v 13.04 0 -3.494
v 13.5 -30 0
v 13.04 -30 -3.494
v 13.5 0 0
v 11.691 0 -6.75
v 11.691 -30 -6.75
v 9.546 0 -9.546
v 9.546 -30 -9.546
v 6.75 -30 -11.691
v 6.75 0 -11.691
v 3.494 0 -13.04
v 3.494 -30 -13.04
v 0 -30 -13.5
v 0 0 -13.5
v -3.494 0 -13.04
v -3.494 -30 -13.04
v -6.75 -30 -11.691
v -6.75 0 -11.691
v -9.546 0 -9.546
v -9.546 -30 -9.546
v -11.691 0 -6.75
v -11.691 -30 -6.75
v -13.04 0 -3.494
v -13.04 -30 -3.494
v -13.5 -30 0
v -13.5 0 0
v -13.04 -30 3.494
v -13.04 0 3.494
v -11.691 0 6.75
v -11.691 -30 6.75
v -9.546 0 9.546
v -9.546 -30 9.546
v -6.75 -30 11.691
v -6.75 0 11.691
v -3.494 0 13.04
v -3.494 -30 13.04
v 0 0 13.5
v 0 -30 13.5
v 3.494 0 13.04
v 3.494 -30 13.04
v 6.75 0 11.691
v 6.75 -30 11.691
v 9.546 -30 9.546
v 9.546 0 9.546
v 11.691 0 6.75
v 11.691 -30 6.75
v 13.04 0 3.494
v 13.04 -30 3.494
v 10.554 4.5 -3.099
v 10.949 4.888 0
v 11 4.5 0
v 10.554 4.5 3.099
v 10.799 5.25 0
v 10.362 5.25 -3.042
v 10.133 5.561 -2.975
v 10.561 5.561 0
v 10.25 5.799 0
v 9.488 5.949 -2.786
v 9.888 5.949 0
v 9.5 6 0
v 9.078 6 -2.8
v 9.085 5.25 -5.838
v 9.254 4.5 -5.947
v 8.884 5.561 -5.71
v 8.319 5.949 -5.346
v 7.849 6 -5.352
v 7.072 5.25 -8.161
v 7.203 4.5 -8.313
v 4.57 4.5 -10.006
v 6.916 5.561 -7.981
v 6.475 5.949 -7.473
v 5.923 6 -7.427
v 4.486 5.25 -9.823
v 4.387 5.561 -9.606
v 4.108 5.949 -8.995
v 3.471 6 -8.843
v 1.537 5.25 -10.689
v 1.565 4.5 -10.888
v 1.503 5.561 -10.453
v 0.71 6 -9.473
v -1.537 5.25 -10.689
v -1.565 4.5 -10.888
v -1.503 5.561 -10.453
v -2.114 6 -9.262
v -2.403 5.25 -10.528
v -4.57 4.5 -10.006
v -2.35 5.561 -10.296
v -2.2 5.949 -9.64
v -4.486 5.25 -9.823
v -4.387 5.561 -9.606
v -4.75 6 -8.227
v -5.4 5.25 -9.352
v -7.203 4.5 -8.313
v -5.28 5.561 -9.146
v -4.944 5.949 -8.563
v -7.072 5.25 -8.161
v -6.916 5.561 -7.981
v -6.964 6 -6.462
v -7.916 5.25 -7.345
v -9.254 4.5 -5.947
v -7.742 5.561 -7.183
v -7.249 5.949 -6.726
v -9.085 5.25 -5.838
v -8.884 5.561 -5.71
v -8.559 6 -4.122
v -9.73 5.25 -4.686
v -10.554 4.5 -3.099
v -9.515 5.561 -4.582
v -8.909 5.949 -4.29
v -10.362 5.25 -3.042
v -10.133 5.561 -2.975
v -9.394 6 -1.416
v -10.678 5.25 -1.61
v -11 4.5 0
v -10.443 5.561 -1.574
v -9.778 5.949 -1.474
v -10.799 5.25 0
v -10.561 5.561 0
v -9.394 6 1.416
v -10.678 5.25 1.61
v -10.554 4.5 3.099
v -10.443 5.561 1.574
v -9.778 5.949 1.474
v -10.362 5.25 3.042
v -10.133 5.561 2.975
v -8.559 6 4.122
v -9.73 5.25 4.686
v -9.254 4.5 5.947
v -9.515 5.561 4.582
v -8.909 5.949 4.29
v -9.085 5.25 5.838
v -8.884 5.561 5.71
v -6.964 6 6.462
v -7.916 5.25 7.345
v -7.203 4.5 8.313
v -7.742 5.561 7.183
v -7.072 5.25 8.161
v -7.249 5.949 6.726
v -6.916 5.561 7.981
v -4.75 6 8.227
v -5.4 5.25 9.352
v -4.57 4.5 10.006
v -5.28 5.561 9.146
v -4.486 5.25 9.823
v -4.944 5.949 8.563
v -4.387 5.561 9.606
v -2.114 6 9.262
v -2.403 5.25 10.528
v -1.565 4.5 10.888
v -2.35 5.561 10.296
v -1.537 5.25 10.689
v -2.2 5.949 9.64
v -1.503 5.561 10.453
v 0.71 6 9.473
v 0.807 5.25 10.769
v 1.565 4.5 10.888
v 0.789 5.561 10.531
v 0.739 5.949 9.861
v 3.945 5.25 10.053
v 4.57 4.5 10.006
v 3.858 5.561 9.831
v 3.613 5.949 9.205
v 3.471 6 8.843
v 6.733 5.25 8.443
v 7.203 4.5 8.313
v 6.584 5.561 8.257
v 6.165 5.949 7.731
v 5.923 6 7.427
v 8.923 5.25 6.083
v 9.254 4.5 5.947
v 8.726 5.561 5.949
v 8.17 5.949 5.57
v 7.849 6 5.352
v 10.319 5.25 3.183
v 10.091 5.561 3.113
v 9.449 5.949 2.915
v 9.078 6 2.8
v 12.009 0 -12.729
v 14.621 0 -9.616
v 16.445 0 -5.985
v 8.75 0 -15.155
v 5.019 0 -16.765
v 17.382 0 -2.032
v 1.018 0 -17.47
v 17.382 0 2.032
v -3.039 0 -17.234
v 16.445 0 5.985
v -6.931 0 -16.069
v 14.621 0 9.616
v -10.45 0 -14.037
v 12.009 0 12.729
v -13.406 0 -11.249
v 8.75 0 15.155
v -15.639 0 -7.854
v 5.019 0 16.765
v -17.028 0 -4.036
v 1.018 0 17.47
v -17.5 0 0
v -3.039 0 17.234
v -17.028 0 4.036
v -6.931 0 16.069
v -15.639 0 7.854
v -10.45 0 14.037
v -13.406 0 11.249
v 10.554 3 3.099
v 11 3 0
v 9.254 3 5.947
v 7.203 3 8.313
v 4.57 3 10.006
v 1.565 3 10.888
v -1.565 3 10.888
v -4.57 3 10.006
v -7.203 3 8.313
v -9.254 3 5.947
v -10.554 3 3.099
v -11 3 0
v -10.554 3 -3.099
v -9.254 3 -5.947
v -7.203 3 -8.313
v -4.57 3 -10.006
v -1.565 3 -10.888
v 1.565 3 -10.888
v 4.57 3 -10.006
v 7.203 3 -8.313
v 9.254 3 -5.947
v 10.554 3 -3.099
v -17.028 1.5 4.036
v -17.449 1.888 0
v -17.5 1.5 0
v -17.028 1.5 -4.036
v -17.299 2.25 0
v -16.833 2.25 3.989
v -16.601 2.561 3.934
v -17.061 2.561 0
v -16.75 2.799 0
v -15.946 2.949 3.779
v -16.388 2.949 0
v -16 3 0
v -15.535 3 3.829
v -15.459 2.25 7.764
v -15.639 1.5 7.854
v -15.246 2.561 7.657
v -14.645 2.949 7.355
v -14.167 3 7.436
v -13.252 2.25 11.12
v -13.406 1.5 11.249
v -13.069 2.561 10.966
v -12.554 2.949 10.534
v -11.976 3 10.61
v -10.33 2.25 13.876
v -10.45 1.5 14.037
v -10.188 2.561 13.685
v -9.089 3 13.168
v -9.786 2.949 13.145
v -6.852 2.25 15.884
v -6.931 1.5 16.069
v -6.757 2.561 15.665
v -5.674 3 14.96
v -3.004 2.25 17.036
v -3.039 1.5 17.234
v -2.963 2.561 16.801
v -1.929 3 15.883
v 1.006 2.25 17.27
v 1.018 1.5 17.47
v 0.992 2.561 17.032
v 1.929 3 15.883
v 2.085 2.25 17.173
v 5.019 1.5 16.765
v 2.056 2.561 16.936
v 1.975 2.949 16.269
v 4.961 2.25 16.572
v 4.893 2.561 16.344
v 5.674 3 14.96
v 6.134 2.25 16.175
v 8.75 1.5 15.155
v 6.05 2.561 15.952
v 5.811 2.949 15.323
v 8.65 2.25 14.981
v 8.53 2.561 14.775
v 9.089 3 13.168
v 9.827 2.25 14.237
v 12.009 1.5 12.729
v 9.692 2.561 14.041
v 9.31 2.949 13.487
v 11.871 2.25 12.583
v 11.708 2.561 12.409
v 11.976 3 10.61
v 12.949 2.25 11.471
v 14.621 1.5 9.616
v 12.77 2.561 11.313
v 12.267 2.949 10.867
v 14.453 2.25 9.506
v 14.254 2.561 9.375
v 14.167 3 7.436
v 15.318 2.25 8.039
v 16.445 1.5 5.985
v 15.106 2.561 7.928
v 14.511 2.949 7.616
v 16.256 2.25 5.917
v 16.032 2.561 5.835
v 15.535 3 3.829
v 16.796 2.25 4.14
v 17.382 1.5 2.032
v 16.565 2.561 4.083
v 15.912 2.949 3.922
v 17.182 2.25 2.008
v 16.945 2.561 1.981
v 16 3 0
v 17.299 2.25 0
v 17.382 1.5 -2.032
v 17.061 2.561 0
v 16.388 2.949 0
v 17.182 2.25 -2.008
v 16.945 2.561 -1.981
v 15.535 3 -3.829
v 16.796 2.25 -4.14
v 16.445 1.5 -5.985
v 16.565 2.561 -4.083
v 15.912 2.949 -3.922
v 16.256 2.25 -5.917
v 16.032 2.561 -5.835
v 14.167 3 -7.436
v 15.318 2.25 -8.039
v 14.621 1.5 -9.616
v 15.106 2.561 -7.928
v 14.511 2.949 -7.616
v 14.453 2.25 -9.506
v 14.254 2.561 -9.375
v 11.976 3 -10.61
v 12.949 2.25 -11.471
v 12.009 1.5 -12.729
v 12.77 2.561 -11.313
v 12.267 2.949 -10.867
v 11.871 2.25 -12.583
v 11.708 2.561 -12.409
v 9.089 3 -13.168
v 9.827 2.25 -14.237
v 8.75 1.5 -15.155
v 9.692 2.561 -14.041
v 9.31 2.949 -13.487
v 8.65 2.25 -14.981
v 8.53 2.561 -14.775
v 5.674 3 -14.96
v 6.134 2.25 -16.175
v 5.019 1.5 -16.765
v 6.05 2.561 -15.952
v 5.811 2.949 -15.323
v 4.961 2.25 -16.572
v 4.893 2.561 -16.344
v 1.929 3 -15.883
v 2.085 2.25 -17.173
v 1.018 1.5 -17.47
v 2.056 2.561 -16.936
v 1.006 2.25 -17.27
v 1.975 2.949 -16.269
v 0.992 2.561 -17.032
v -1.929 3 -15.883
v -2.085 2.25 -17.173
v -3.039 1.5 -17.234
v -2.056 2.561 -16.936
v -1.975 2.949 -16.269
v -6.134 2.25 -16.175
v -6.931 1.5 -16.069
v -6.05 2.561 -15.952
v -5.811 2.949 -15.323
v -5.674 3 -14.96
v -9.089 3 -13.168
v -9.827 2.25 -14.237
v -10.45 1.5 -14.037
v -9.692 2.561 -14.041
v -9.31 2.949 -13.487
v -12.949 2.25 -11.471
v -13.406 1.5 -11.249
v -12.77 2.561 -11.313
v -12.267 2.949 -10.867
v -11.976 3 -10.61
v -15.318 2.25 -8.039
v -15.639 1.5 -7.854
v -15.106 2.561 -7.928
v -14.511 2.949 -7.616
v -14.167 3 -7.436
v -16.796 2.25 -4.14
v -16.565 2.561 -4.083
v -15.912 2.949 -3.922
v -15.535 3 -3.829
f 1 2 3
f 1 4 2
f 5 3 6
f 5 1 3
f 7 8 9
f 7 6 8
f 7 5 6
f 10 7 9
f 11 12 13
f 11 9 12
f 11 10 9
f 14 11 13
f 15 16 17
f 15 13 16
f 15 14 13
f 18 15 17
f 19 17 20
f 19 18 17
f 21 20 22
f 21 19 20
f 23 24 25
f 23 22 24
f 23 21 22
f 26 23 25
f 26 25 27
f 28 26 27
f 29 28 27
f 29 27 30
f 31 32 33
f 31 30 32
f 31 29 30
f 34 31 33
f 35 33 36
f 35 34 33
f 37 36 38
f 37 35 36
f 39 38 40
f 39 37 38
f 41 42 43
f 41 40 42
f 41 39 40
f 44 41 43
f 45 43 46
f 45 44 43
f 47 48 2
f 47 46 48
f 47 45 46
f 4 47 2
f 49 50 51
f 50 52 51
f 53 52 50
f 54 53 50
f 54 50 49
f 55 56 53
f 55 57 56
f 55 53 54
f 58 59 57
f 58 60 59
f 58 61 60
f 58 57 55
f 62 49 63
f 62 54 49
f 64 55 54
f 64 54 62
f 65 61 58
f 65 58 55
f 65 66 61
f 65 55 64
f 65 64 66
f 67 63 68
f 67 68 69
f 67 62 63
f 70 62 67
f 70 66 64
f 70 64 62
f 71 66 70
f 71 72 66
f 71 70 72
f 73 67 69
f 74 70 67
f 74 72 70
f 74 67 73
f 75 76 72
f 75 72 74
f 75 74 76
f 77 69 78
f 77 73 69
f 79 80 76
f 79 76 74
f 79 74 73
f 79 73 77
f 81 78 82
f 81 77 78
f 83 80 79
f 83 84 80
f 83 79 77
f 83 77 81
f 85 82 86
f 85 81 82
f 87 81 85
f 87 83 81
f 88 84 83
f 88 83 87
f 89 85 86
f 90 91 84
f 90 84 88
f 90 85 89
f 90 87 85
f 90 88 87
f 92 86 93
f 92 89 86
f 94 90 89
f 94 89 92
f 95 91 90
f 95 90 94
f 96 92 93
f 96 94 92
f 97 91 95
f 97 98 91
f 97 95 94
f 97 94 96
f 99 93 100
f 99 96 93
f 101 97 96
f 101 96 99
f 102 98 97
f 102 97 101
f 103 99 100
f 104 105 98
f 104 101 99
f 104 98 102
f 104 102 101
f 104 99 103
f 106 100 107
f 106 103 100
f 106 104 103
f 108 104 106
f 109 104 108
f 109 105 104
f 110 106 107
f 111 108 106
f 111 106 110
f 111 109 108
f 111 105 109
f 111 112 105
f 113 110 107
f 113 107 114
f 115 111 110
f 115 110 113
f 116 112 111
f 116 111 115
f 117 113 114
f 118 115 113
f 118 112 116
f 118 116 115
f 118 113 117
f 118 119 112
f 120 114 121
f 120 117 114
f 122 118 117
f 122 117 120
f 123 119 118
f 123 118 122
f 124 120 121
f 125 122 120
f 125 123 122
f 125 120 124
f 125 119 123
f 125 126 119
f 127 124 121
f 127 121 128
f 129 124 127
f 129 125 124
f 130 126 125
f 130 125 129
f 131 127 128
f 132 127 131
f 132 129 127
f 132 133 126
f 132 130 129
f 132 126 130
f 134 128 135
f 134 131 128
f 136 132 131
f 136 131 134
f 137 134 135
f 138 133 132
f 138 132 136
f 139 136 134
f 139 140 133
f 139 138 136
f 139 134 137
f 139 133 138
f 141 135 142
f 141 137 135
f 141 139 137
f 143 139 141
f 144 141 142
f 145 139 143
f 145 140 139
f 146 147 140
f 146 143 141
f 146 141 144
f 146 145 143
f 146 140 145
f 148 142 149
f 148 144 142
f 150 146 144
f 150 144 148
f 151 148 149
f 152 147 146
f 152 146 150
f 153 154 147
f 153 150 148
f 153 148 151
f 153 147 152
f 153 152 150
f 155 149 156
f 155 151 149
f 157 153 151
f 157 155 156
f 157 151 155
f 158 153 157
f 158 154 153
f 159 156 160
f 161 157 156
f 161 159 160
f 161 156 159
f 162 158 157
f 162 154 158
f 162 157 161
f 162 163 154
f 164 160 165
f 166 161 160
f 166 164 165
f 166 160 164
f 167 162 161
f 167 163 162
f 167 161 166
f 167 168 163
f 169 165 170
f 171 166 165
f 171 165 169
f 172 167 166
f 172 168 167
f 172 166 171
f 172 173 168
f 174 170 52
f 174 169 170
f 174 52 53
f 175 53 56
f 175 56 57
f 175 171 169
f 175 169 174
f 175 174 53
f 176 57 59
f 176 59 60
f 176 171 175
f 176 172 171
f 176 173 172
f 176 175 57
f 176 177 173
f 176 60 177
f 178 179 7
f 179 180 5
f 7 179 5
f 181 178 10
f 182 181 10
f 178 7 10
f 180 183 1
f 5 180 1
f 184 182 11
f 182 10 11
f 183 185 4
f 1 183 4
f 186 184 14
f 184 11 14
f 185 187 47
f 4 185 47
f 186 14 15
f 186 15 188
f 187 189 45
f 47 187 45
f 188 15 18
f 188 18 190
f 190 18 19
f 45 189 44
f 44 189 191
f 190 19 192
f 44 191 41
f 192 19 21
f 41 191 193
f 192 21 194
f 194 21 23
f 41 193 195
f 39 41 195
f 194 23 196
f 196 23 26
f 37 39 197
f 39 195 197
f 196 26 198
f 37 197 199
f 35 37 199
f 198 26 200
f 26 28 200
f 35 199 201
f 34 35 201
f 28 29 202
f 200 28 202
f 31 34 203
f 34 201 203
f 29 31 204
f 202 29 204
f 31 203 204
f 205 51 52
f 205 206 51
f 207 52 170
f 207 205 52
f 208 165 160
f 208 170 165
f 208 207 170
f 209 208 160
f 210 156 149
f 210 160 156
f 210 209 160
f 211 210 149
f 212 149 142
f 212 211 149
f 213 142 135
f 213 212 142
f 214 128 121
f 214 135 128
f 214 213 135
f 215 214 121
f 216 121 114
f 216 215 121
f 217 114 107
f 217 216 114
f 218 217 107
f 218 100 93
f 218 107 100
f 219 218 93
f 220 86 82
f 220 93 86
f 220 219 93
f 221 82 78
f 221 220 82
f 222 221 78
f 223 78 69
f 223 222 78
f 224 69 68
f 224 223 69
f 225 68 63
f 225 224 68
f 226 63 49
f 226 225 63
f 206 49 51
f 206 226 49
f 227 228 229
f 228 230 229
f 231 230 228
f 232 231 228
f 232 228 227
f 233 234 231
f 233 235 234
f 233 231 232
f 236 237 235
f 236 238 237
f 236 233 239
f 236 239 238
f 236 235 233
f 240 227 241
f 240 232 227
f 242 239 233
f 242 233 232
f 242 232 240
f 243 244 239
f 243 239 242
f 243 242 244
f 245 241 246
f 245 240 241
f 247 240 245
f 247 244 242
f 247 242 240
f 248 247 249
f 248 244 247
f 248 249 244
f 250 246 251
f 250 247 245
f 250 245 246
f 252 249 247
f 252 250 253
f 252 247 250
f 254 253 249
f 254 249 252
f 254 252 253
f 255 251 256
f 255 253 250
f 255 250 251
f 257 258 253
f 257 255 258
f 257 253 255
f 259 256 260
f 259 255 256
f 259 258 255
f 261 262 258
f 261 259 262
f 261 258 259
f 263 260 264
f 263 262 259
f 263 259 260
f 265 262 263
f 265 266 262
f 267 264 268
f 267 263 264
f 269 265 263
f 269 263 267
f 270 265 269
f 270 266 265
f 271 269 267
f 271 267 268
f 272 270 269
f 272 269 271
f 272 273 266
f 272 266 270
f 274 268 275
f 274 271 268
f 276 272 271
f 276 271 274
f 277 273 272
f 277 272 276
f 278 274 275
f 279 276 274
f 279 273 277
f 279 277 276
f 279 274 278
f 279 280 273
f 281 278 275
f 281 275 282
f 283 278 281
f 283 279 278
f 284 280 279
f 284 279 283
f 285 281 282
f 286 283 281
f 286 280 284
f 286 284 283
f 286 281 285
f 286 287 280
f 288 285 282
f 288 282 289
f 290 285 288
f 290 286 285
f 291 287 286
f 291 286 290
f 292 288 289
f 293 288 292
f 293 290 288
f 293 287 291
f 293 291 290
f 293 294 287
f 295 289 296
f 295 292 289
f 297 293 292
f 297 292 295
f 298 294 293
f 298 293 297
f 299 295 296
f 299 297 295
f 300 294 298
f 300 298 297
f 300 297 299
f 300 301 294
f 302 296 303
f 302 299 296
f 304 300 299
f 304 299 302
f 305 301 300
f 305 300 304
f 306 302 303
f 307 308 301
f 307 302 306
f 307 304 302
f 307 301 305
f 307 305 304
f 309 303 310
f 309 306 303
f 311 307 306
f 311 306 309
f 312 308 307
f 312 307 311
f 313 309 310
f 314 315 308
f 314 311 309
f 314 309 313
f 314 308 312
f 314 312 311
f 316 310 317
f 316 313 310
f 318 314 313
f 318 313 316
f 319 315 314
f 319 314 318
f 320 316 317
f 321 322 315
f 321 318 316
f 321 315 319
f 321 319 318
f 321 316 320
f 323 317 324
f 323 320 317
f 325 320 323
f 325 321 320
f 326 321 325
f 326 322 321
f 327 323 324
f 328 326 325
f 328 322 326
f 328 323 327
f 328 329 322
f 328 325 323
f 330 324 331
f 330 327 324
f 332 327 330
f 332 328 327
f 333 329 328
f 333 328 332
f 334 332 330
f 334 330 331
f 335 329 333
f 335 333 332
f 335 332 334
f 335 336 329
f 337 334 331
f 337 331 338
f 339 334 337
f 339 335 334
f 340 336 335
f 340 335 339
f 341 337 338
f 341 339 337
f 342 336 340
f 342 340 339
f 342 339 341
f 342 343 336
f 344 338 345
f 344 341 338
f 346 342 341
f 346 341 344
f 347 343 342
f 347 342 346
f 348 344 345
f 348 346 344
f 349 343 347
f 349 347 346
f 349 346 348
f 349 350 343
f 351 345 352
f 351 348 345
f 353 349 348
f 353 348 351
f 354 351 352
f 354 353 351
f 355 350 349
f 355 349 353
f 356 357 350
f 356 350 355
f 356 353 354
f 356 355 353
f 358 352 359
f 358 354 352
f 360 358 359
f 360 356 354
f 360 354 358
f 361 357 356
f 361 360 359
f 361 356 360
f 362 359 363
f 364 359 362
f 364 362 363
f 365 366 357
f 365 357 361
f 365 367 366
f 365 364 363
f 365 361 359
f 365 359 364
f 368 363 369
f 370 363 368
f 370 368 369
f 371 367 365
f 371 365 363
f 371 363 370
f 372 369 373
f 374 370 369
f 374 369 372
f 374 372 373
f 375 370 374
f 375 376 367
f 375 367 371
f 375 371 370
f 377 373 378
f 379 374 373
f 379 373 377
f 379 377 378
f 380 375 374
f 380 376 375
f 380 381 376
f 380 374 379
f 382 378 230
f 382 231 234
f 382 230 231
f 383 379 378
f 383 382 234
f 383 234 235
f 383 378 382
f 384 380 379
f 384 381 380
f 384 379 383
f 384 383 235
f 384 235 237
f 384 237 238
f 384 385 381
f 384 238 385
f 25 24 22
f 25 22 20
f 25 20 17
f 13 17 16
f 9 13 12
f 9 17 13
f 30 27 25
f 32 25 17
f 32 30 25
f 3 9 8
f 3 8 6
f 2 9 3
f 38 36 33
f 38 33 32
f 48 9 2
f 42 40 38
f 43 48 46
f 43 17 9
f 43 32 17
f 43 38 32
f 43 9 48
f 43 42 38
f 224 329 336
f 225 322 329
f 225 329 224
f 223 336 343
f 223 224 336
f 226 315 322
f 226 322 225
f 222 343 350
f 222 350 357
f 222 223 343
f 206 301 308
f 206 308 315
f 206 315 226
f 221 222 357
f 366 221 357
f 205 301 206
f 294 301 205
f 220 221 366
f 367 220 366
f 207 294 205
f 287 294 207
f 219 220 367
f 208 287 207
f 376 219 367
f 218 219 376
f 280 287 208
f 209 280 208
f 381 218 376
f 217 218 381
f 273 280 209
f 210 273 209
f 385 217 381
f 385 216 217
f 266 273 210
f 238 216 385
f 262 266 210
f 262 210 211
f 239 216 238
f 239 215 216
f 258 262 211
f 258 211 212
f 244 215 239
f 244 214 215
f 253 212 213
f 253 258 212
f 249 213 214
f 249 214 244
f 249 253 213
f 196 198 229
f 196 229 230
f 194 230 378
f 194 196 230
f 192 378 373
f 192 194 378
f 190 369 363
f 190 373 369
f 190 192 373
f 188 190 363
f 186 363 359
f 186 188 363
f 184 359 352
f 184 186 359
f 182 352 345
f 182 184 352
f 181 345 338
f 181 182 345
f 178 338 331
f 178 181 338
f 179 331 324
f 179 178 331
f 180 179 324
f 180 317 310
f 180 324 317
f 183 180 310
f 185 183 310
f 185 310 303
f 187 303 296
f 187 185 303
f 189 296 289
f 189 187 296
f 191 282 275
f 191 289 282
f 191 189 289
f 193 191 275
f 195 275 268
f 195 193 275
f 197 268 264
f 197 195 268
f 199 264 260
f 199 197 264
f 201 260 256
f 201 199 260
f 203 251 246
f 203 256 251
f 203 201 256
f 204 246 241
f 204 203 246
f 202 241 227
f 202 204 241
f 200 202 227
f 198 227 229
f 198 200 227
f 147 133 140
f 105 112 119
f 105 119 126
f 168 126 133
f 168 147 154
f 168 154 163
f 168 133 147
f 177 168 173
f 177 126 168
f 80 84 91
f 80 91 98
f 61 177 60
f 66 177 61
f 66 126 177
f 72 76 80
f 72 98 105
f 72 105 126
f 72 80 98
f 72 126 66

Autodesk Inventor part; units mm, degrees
ref_plane "YZ Plane" through (0, 0, 0) normal (1, 0, 0) x (0, 1, 0)
ref_plane "XZ Plane" through (0, 0, 0) normal (0, 1, 0) x (-1, 0, 0)
ref_plane "XY Plane" through (0, 0, 0) normal (0, 0, 1) x (1, 0, 0)
sketch "Sketch1" plane through (0, 0, 0) normal (0, 1, 0) x (-1, 0, 0)
  circle A0 centre (0, 0) radius 17.5
  dimension "d0" = 35
extrude "Extrusion1" add sketch "Sketch1" along normal blind 3
sketch "Sketch2" plane through (0, 3, 0) normal (0, 1, 0) x (1, 0, 0)
  circle A0 centre (0, 0) radius 11
  dimension "d3" = 22
extrude "Extrusion2" add sketch "Sketch2" along normal blind 3
sketch "Sketch3" plane through (0, 0, 0) normal (0, -1, 0) x (1, 0, 0)
  circle A0 centre (0, 0) radius 13.5
  dimension "d6" = 27
extrude "Extrusion3" add sketch "Sketch3" along normal blind 30
fillet "Fillet1" radius 1.5 1 edges at (17.5, 3, 0)
fillet "Fillet2" radius 1.5 1 edges at (-11, 6, 0)
thread "Thread1" size "M27x1.5" class "6g" standard "ANSI Metric M Profile" full length
properties part number "Boton" material "ABS Plastic"
